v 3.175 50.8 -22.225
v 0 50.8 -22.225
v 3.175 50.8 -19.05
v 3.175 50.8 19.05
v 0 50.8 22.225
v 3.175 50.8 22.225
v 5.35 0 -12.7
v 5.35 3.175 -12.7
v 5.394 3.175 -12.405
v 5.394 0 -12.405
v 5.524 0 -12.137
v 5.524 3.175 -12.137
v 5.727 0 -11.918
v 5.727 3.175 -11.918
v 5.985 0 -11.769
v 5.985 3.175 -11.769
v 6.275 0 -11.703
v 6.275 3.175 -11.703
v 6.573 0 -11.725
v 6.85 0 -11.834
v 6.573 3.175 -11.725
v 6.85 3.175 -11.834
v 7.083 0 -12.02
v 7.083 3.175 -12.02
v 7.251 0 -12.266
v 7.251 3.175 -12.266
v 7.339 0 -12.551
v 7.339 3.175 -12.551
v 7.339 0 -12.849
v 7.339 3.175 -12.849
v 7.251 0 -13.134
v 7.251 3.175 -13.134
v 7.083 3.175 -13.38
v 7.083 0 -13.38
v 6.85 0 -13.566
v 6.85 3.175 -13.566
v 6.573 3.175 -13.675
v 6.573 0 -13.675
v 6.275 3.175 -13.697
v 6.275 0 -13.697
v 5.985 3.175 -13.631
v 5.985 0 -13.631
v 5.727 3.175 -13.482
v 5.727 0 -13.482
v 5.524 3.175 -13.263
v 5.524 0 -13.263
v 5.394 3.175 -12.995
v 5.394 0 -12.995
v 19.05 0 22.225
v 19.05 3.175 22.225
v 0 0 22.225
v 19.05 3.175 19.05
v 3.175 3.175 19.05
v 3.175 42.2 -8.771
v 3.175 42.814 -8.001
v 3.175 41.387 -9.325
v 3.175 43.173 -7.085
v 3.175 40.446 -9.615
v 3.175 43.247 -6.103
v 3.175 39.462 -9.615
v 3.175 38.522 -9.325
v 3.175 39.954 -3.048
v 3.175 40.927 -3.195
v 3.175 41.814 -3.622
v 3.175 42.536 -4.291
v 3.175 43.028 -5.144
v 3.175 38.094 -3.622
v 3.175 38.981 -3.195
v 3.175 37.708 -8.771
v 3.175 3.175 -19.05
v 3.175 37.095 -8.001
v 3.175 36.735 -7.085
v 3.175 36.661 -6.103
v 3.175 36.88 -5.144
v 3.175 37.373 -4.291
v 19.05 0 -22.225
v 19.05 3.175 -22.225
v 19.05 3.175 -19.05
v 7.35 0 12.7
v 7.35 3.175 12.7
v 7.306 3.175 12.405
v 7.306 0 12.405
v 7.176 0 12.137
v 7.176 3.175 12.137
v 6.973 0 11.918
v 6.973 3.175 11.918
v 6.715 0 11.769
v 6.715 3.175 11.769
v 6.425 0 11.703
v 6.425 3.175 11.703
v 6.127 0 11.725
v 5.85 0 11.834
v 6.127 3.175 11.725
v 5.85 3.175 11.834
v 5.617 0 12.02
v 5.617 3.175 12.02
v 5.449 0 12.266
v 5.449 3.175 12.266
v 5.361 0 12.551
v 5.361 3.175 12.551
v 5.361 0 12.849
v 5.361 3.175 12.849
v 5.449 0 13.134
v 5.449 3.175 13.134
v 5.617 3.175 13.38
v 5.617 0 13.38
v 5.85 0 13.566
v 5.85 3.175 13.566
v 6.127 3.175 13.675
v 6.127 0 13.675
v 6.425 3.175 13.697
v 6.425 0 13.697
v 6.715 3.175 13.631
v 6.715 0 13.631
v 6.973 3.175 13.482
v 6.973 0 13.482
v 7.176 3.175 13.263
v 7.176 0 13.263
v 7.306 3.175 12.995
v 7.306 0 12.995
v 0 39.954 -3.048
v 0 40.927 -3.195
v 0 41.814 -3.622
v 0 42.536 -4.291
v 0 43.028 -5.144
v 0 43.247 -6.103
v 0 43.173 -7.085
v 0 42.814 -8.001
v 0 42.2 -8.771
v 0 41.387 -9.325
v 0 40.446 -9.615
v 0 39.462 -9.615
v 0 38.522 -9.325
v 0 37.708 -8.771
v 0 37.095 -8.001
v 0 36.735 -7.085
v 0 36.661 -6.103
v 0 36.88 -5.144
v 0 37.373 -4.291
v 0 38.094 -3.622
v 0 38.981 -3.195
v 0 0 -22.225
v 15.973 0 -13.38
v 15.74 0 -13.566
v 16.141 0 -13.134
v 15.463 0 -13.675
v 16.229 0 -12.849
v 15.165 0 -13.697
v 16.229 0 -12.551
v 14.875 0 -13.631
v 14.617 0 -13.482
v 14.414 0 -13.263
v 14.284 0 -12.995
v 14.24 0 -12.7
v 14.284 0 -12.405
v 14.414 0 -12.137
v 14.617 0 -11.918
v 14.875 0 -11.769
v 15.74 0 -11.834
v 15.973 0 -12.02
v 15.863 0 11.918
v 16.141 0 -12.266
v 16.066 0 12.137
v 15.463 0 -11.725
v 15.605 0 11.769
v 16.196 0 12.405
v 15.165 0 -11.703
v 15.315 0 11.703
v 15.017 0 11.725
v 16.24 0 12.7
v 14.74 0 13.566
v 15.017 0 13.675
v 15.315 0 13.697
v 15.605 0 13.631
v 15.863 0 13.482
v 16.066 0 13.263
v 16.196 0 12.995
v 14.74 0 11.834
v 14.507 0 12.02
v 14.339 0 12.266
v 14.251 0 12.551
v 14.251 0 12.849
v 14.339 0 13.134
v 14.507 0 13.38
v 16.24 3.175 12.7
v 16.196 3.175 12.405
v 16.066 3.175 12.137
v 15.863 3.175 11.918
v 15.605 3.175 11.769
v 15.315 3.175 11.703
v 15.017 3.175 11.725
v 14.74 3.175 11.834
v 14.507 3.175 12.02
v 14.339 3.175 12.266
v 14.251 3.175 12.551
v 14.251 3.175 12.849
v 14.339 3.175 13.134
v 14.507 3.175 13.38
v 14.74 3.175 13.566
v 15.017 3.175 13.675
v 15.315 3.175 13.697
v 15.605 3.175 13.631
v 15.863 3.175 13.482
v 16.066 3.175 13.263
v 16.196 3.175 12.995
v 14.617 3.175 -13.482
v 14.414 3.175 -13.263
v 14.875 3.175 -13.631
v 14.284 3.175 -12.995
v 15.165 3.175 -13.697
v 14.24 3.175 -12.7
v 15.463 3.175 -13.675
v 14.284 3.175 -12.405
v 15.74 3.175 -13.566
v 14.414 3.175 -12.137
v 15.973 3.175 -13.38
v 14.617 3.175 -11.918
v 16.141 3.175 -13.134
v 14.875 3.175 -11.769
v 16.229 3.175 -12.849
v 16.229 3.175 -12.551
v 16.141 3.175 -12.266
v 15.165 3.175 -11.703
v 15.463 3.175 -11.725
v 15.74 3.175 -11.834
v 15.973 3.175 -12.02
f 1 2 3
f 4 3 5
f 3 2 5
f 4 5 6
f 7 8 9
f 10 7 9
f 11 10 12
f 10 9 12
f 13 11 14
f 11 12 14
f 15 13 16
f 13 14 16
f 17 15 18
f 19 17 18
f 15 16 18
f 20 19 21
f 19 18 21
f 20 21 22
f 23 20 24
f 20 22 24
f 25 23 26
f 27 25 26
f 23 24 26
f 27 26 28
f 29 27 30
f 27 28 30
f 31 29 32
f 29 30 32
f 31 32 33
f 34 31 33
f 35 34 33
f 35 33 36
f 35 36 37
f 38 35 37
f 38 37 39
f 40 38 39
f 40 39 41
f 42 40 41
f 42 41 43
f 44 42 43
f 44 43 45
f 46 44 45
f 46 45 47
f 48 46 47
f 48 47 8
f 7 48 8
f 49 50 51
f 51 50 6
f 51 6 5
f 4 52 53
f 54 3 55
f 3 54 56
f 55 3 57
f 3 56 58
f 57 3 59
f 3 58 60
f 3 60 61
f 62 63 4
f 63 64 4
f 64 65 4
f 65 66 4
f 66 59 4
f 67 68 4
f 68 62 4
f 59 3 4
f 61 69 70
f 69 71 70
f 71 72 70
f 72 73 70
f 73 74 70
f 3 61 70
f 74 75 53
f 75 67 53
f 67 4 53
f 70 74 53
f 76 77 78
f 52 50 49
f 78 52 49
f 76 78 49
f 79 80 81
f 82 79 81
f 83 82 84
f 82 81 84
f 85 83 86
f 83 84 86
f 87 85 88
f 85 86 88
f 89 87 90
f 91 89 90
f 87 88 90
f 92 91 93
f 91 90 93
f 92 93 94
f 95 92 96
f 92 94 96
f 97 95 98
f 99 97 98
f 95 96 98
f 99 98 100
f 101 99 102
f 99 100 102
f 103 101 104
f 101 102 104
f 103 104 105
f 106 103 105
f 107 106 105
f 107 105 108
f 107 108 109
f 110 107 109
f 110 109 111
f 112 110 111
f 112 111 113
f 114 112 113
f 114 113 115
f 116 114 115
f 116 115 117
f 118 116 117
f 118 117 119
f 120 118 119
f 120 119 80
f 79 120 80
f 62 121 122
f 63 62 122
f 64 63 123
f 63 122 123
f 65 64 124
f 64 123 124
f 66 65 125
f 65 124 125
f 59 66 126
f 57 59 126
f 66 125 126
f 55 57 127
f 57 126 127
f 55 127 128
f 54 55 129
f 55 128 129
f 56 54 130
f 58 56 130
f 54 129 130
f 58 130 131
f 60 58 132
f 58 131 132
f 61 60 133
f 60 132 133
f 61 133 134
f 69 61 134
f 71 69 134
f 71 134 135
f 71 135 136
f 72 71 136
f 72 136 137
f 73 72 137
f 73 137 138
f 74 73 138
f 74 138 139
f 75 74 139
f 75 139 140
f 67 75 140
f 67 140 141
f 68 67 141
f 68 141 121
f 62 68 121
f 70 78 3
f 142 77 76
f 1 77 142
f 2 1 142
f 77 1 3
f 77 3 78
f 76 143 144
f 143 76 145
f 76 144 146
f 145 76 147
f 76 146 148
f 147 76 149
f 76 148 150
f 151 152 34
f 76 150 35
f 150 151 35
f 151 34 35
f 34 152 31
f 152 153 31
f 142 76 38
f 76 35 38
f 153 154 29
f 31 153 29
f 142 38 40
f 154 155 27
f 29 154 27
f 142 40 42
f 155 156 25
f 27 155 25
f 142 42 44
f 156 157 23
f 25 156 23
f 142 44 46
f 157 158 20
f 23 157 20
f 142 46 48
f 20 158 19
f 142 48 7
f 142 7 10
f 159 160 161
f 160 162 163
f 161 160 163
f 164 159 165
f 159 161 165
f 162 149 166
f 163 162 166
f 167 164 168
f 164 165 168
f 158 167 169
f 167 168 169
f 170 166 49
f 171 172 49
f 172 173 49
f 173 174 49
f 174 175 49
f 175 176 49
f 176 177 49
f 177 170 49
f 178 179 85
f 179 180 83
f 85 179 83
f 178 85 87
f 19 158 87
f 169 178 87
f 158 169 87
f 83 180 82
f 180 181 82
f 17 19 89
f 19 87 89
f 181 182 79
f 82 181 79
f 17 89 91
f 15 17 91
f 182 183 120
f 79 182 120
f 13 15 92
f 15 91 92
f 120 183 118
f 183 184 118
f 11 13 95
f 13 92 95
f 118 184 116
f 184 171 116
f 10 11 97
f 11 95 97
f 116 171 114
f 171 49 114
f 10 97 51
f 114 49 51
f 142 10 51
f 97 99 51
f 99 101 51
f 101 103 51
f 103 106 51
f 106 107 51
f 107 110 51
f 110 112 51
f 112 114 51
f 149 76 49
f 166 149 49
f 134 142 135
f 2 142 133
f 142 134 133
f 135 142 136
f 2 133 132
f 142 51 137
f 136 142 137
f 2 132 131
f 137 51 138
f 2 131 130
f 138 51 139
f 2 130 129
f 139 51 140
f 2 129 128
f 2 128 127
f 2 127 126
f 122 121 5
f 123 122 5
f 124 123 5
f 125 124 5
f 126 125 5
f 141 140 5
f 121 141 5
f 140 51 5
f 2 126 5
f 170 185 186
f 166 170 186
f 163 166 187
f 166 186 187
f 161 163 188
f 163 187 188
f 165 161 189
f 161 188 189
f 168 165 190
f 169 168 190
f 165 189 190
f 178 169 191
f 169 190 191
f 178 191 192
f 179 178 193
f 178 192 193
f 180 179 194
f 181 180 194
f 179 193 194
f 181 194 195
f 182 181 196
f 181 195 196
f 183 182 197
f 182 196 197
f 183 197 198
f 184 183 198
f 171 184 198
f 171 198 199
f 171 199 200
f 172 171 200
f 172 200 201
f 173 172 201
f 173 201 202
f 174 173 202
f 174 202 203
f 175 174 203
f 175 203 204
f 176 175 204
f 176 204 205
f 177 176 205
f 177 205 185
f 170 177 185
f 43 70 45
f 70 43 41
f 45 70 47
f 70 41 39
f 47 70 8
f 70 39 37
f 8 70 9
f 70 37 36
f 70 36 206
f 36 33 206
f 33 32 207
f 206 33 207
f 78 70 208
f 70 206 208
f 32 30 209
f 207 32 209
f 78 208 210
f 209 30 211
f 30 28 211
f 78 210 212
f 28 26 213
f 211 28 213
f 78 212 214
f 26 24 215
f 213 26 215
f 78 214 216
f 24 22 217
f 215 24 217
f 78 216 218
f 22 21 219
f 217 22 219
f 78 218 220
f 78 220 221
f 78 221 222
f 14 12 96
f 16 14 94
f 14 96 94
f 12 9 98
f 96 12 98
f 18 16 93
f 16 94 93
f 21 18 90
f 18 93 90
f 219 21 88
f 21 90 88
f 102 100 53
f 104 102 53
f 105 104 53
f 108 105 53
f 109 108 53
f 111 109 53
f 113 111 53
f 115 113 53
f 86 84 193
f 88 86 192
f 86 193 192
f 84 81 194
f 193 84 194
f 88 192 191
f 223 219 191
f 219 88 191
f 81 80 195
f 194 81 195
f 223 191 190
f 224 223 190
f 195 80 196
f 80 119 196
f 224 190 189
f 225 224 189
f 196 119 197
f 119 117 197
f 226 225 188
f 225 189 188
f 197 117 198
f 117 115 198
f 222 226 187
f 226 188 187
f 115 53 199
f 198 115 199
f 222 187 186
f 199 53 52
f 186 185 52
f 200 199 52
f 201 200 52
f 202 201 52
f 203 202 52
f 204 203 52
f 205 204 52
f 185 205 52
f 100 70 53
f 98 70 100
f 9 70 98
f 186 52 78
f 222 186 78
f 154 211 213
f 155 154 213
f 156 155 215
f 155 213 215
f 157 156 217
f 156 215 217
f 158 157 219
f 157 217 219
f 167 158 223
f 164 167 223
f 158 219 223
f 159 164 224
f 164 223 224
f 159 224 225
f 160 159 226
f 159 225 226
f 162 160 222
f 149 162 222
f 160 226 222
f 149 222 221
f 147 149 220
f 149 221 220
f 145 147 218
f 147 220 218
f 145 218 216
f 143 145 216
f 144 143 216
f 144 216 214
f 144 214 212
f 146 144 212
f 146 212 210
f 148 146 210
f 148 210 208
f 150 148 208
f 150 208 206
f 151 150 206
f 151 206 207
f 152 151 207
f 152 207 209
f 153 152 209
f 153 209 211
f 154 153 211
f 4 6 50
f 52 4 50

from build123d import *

# Parameters (mm, degrees)
BOSS_EXTRUDE1_DEPTH = 22.225
SKETCH2_R           = 3.302
CUT_EXTRUDE1_DEPTH  = 59.630138368
BOSS_EXTRUDE2_DEPTH = 3.175
SKETCH4_R           = 1.000000032
CUT_EXTRUDE2_DEPTH  = 56.901643536


with BuildPart() as part:
    # Sketch1 → Boss-Extrude1 (new, symmetric)
    with BuildSketch(Plane.XY):
        Polygon((0, 0), (0, 50.8), (3.175, 50.8), (3.175, 3.175), (19.05, 3.175), (19.05, 0), align=None)
    extrude(amount=BOSS_EXTRUDE1_DEPTH, both=True)

    # Sketch2 → Cut-Extrude1 (cut, through all)
    with BuildSketch(Plane.ZY):
        with Locations((-6.35, 39.9542)):
            Circle(SKETCH2_R)
    extrude(amount=-CUT_EXTRUDE1_DEPTH, mode=Mode.SUBTRACT)

    # Sketch3 → Boss-Extrude2 (add)
    with BuildSketch(Plane.XY.offset(22.225)):
        Polygon((3.175, 50.8), (19.05, 3.175), (3.175, 3.175), align=None)
    boss_extrude2 = extrude(amount=-BOSS_EXTRUDE2_DEPTH)

    # Mirror1: Boss-Extrude2 across plane
    add(boss_extrude2.mirror(Plane.XY))

    # Sketch4 → Cut-Extrude2 (cut, through all)
    with BuildSketch(Plane(origin=(0, 3.175, 0), x_dir=(1, 0, 0), z_dir=(0, 1, 0))):
        with Locations(Location((6.35, 12.7, 0), (0, 0, 180))):
            Circle(SKETCH4_R)
        with Locations(Location((15.24, 12.7, 0), (0, 0, 180))):
            Circle(SKETCH4_R)
        with Locations((15.24, -12.7)):
            Circle(SKETCH4_R)
        with Locations((6.35, -12.7)):
            Circle(SKETCH4_R)
    extrude(amount=-CUT_EXTRUDE2_DEPTH, mode=Mode.SUBTRACT)


solid = part.part
